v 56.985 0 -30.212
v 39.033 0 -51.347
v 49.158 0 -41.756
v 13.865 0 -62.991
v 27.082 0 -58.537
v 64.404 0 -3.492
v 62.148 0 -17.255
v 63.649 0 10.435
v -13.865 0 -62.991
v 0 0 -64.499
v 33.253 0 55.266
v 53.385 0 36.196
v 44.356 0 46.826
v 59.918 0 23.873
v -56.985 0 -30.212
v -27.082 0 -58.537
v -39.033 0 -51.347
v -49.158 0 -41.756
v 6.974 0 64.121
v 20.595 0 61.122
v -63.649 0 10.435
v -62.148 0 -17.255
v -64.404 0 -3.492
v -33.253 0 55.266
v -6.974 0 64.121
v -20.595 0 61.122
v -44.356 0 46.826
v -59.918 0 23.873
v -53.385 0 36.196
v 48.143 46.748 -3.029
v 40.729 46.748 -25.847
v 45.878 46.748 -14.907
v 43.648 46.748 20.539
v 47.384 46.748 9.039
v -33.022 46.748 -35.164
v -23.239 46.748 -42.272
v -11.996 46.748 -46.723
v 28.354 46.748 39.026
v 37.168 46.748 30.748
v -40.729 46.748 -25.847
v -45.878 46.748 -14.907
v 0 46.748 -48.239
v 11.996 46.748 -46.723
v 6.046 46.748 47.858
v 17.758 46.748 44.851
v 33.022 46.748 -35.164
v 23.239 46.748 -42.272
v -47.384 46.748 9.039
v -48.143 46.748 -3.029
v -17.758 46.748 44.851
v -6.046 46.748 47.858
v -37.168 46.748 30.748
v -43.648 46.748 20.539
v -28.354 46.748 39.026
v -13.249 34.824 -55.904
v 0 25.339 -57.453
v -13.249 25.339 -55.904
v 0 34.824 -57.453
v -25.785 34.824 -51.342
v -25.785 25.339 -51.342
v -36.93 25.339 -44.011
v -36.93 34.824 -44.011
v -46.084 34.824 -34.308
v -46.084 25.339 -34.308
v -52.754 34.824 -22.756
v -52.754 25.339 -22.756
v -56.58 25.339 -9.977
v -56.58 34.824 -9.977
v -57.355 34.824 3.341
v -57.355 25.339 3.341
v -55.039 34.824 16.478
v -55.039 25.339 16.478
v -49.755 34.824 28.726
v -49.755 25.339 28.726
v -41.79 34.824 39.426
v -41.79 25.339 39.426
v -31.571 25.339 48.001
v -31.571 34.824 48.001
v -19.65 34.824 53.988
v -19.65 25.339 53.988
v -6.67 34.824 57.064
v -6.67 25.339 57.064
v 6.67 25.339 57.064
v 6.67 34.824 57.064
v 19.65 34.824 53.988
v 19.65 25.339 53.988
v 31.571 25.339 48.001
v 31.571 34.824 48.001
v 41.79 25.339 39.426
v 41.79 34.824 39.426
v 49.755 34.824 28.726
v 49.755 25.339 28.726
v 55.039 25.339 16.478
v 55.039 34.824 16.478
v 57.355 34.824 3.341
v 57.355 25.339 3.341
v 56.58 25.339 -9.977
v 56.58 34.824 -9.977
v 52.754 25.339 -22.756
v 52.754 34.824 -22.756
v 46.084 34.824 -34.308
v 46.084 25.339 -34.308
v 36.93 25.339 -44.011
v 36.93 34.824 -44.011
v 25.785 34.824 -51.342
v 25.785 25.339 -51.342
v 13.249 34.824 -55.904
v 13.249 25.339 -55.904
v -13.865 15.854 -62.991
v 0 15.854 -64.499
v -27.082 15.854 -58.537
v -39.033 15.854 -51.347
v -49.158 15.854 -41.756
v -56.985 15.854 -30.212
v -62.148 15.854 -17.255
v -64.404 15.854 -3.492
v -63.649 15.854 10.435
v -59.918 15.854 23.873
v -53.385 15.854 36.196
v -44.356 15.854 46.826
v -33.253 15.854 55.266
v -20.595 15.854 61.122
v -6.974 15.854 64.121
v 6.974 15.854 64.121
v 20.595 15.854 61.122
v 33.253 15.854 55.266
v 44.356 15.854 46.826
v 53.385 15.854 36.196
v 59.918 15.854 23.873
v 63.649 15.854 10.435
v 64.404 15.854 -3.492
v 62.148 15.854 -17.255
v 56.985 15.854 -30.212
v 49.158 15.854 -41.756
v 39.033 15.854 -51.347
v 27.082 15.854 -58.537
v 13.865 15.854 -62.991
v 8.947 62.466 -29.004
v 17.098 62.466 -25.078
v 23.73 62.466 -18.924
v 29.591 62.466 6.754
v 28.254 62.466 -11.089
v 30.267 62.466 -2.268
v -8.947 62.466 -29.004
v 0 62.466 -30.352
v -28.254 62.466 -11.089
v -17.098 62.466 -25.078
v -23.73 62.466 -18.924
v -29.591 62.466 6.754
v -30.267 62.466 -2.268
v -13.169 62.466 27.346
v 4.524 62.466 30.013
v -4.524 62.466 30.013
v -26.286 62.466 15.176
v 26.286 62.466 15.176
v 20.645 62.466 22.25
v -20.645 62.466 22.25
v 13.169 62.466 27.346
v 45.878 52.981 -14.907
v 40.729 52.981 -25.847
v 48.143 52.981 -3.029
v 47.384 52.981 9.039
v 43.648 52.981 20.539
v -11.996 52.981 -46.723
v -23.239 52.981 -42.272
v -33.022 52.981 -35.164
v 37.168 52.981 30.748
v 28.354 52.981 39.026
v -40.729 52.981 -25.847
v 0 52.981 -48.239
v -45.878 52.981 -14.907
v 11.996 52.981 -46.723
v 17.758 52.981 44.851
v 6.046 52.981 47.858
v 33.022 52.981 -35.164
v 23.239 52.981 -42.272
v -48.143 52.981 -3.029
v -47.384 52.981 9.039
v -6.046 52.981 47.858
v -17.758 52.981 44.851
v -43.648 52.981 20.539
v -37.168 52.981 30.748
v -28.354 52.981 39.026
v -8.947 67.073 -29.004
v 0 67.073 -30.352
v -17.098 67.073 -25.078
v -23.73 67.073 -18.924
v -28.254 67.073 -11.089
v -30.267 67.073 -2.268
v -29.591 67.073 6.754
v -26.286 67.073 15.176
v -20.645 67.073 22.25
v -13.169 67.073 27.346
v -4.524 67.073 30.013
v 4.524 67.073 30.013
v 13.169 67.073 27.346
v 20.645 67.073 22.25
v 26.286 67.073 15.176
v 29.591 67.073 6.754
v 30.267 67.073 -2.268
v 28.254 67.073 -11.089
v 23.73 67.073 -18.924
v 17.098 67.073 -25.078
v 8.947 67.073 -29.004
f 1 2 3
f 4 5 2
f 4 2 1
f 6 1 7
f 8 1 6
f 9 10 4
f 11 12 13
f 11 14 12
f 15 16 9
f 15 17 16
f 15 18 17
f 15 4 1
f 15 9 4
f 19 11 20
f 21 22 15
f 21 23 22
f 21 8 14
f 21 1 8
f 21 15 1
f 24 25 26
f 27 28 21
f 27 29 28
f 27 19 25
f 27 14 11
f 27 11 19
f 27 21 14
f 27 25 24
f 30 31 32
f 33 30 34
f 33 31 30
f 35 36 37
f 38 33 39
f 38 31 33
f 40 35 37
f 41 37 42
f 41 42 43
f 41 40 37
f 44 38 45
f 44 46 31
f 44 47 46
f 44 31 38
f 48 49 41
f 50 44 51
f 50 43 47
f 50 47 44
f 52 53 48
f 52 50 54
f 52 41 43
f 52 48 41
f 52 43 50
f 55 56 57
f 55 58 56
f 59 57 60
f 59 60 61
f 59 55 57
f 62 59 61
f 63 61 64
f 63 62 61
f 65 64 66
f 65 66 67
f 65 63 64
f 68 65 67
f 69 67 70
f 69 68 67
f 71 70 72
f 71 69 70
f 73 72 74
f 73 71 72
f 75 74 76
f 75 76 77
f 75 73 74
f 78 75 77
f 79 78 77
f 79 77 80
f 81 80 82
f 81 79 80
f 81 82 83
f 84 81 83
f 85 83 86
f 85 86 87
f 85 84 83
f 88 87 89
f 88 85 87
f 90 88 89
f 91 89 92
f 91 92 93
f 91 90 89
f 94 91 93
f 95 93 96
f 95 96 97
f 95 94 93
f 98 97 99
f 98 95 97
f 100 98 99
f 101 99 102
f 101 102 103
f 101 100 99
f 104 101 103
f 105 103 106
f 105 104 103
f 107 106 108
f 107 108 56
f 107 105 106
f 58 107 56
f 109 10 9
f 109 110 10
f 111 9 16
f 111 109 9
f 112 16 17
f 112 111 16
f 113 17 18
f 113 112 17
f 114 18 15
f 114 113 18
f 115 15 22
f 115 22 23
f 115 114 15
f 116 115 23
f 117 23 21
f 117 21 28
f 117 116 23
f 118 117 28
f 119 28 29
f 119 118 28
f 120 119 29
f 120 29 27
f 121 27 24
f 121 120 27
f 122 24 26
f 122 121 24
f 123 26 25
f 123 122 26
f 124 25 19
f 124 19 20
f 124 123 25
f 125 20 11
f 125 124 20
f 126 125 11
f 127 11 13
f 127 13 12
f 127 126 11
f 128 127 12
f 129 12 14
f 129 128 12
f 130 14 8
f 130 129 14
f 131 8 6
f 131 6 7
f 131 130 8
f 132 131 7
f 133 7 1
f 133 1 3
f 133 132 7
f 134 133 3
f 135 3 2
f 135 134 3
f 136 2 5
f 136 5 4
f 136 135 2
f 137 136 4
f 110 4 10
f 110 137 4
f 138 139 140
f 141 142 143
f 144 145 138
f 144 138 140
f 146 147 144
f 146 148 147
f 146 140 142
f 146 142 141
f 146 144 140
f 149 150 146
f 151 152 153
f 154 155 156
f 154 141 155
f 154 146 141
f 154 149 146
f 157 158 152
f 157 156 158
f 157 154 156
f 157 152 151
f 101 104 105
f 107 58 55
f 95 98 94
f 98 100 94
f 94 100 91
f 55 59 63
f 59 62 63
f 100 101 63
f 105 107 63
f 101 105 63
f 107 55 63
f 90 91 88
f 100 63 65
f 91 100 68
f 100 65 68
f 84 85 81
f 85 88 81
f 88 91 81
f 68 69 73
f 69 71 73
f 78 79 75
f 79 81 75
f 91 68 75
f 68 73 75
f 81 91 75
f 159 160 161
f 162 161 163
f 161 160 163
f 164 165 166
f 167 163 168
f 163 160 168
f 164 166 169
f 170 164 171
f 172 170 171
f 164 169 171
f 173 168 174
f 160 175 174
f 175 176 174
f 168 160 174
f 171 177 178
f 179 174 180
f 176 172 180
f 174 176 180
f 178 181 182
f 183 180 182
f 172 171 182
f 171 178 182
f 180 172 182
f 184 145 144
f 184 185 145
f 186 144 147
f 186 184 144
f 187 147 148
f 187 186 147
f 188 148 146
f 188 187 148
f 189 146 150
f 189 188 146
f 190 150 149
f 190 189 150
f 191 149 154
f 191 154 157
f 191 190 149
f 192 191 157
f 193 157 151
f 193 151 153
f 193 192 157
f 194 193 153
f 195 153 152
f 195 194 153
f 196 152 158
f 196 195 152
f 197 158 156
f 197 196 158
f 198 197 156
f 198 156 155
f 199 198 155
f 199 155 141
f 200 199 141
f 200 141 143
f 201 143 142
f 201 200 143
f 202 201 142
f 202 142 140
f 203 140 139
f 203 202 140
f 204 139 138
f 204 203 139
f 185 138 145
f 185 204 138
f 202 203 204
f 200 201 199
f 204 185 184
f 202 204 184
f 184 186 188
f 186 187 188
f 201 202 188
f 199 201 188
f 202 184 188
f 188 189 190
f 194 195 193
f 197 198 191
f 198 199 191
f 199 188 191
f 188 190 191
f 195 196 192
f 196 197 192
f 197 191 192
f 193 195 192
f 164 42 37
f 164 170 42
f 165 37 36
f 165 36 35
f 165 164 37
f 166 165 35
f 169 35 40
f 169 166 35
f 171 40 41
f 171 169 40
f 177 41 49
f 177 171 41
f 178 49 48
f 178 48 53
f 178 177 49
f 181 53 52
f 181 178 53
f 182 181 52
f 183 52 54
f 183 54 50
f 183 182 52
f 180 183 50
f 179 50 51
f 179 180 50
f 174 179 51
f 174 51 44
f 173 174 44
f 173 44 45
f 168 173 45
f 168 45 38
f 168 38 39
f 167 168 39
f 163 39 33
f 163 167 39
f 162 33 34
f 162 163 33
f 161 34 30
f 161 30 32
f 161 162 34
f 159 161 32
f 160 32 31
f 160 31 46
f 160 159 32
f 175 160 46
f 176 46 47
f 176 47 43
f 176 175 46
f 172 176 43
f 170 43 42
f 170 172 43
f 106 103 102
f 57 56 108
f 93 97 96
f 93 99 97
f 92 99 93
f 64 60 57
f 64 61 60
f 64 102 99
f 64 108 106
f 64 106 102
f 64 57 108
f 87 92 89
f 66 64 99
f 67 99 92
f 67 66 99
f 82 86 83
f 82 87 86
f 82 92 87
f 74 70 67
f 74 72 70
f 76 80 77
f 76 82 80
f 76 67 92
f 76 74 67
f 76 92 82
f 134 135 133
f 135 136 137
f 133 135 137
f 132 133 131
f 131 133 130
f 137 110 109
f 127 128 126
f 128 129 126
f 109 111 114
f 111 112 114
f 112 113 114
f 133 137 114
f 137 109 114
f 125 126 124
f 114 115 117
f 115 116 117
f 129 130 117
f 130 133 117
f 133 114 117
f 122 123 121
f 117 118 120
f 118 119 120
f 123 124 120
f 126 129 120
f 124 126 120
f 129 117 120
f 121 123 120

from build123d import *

# Parameters (mm, degrees)
SKETCH1_W   = 64.498680347
SKETCH1_H   = 15.853667228
SKETCH1_W_2 = 57.452606024
SKETCH1_H_2 = 9.485100051
SKETCH1_W_3 = 48.238508831
SKETCH1_H_3 = 6.233065748
SKETCH1_W_4 = 30.352320163
SKETCH1_H_4 = 4.607048596


with BuildPart() as part:
    # Sketch1 → Revolve1 (revolve)
    with BuildSketch(Plane.XY, mode=Mode.PRIVATE) as revolve1_sk:
        with Locations((32.249340174, 7.926833614)):
            Rectangle(SKETCH1_W, SKETCH1_H)
        with Locations((28.726303012, 30.081317305)):
            Rectangle(SKETCH1_W_2, SKETCH1_H_2)
        with Locations((24.119254416, 49.864525983)):
            Rectangle(SKETCH1_W_3, SKETCH1_H_3)
        with Locations((15.176160082, 64.769683206)):
            Rectangle(SKETCH1_W_4, SKETCH1_H_4)
    revolve(revolve1_sk.sketch.rotate(Axis((0, 25.338767279, 0), (0, 1, 0)), 90), axis=Axis((0, 25.338767279, 0), (0, 1, 0)))


solid = part.part
